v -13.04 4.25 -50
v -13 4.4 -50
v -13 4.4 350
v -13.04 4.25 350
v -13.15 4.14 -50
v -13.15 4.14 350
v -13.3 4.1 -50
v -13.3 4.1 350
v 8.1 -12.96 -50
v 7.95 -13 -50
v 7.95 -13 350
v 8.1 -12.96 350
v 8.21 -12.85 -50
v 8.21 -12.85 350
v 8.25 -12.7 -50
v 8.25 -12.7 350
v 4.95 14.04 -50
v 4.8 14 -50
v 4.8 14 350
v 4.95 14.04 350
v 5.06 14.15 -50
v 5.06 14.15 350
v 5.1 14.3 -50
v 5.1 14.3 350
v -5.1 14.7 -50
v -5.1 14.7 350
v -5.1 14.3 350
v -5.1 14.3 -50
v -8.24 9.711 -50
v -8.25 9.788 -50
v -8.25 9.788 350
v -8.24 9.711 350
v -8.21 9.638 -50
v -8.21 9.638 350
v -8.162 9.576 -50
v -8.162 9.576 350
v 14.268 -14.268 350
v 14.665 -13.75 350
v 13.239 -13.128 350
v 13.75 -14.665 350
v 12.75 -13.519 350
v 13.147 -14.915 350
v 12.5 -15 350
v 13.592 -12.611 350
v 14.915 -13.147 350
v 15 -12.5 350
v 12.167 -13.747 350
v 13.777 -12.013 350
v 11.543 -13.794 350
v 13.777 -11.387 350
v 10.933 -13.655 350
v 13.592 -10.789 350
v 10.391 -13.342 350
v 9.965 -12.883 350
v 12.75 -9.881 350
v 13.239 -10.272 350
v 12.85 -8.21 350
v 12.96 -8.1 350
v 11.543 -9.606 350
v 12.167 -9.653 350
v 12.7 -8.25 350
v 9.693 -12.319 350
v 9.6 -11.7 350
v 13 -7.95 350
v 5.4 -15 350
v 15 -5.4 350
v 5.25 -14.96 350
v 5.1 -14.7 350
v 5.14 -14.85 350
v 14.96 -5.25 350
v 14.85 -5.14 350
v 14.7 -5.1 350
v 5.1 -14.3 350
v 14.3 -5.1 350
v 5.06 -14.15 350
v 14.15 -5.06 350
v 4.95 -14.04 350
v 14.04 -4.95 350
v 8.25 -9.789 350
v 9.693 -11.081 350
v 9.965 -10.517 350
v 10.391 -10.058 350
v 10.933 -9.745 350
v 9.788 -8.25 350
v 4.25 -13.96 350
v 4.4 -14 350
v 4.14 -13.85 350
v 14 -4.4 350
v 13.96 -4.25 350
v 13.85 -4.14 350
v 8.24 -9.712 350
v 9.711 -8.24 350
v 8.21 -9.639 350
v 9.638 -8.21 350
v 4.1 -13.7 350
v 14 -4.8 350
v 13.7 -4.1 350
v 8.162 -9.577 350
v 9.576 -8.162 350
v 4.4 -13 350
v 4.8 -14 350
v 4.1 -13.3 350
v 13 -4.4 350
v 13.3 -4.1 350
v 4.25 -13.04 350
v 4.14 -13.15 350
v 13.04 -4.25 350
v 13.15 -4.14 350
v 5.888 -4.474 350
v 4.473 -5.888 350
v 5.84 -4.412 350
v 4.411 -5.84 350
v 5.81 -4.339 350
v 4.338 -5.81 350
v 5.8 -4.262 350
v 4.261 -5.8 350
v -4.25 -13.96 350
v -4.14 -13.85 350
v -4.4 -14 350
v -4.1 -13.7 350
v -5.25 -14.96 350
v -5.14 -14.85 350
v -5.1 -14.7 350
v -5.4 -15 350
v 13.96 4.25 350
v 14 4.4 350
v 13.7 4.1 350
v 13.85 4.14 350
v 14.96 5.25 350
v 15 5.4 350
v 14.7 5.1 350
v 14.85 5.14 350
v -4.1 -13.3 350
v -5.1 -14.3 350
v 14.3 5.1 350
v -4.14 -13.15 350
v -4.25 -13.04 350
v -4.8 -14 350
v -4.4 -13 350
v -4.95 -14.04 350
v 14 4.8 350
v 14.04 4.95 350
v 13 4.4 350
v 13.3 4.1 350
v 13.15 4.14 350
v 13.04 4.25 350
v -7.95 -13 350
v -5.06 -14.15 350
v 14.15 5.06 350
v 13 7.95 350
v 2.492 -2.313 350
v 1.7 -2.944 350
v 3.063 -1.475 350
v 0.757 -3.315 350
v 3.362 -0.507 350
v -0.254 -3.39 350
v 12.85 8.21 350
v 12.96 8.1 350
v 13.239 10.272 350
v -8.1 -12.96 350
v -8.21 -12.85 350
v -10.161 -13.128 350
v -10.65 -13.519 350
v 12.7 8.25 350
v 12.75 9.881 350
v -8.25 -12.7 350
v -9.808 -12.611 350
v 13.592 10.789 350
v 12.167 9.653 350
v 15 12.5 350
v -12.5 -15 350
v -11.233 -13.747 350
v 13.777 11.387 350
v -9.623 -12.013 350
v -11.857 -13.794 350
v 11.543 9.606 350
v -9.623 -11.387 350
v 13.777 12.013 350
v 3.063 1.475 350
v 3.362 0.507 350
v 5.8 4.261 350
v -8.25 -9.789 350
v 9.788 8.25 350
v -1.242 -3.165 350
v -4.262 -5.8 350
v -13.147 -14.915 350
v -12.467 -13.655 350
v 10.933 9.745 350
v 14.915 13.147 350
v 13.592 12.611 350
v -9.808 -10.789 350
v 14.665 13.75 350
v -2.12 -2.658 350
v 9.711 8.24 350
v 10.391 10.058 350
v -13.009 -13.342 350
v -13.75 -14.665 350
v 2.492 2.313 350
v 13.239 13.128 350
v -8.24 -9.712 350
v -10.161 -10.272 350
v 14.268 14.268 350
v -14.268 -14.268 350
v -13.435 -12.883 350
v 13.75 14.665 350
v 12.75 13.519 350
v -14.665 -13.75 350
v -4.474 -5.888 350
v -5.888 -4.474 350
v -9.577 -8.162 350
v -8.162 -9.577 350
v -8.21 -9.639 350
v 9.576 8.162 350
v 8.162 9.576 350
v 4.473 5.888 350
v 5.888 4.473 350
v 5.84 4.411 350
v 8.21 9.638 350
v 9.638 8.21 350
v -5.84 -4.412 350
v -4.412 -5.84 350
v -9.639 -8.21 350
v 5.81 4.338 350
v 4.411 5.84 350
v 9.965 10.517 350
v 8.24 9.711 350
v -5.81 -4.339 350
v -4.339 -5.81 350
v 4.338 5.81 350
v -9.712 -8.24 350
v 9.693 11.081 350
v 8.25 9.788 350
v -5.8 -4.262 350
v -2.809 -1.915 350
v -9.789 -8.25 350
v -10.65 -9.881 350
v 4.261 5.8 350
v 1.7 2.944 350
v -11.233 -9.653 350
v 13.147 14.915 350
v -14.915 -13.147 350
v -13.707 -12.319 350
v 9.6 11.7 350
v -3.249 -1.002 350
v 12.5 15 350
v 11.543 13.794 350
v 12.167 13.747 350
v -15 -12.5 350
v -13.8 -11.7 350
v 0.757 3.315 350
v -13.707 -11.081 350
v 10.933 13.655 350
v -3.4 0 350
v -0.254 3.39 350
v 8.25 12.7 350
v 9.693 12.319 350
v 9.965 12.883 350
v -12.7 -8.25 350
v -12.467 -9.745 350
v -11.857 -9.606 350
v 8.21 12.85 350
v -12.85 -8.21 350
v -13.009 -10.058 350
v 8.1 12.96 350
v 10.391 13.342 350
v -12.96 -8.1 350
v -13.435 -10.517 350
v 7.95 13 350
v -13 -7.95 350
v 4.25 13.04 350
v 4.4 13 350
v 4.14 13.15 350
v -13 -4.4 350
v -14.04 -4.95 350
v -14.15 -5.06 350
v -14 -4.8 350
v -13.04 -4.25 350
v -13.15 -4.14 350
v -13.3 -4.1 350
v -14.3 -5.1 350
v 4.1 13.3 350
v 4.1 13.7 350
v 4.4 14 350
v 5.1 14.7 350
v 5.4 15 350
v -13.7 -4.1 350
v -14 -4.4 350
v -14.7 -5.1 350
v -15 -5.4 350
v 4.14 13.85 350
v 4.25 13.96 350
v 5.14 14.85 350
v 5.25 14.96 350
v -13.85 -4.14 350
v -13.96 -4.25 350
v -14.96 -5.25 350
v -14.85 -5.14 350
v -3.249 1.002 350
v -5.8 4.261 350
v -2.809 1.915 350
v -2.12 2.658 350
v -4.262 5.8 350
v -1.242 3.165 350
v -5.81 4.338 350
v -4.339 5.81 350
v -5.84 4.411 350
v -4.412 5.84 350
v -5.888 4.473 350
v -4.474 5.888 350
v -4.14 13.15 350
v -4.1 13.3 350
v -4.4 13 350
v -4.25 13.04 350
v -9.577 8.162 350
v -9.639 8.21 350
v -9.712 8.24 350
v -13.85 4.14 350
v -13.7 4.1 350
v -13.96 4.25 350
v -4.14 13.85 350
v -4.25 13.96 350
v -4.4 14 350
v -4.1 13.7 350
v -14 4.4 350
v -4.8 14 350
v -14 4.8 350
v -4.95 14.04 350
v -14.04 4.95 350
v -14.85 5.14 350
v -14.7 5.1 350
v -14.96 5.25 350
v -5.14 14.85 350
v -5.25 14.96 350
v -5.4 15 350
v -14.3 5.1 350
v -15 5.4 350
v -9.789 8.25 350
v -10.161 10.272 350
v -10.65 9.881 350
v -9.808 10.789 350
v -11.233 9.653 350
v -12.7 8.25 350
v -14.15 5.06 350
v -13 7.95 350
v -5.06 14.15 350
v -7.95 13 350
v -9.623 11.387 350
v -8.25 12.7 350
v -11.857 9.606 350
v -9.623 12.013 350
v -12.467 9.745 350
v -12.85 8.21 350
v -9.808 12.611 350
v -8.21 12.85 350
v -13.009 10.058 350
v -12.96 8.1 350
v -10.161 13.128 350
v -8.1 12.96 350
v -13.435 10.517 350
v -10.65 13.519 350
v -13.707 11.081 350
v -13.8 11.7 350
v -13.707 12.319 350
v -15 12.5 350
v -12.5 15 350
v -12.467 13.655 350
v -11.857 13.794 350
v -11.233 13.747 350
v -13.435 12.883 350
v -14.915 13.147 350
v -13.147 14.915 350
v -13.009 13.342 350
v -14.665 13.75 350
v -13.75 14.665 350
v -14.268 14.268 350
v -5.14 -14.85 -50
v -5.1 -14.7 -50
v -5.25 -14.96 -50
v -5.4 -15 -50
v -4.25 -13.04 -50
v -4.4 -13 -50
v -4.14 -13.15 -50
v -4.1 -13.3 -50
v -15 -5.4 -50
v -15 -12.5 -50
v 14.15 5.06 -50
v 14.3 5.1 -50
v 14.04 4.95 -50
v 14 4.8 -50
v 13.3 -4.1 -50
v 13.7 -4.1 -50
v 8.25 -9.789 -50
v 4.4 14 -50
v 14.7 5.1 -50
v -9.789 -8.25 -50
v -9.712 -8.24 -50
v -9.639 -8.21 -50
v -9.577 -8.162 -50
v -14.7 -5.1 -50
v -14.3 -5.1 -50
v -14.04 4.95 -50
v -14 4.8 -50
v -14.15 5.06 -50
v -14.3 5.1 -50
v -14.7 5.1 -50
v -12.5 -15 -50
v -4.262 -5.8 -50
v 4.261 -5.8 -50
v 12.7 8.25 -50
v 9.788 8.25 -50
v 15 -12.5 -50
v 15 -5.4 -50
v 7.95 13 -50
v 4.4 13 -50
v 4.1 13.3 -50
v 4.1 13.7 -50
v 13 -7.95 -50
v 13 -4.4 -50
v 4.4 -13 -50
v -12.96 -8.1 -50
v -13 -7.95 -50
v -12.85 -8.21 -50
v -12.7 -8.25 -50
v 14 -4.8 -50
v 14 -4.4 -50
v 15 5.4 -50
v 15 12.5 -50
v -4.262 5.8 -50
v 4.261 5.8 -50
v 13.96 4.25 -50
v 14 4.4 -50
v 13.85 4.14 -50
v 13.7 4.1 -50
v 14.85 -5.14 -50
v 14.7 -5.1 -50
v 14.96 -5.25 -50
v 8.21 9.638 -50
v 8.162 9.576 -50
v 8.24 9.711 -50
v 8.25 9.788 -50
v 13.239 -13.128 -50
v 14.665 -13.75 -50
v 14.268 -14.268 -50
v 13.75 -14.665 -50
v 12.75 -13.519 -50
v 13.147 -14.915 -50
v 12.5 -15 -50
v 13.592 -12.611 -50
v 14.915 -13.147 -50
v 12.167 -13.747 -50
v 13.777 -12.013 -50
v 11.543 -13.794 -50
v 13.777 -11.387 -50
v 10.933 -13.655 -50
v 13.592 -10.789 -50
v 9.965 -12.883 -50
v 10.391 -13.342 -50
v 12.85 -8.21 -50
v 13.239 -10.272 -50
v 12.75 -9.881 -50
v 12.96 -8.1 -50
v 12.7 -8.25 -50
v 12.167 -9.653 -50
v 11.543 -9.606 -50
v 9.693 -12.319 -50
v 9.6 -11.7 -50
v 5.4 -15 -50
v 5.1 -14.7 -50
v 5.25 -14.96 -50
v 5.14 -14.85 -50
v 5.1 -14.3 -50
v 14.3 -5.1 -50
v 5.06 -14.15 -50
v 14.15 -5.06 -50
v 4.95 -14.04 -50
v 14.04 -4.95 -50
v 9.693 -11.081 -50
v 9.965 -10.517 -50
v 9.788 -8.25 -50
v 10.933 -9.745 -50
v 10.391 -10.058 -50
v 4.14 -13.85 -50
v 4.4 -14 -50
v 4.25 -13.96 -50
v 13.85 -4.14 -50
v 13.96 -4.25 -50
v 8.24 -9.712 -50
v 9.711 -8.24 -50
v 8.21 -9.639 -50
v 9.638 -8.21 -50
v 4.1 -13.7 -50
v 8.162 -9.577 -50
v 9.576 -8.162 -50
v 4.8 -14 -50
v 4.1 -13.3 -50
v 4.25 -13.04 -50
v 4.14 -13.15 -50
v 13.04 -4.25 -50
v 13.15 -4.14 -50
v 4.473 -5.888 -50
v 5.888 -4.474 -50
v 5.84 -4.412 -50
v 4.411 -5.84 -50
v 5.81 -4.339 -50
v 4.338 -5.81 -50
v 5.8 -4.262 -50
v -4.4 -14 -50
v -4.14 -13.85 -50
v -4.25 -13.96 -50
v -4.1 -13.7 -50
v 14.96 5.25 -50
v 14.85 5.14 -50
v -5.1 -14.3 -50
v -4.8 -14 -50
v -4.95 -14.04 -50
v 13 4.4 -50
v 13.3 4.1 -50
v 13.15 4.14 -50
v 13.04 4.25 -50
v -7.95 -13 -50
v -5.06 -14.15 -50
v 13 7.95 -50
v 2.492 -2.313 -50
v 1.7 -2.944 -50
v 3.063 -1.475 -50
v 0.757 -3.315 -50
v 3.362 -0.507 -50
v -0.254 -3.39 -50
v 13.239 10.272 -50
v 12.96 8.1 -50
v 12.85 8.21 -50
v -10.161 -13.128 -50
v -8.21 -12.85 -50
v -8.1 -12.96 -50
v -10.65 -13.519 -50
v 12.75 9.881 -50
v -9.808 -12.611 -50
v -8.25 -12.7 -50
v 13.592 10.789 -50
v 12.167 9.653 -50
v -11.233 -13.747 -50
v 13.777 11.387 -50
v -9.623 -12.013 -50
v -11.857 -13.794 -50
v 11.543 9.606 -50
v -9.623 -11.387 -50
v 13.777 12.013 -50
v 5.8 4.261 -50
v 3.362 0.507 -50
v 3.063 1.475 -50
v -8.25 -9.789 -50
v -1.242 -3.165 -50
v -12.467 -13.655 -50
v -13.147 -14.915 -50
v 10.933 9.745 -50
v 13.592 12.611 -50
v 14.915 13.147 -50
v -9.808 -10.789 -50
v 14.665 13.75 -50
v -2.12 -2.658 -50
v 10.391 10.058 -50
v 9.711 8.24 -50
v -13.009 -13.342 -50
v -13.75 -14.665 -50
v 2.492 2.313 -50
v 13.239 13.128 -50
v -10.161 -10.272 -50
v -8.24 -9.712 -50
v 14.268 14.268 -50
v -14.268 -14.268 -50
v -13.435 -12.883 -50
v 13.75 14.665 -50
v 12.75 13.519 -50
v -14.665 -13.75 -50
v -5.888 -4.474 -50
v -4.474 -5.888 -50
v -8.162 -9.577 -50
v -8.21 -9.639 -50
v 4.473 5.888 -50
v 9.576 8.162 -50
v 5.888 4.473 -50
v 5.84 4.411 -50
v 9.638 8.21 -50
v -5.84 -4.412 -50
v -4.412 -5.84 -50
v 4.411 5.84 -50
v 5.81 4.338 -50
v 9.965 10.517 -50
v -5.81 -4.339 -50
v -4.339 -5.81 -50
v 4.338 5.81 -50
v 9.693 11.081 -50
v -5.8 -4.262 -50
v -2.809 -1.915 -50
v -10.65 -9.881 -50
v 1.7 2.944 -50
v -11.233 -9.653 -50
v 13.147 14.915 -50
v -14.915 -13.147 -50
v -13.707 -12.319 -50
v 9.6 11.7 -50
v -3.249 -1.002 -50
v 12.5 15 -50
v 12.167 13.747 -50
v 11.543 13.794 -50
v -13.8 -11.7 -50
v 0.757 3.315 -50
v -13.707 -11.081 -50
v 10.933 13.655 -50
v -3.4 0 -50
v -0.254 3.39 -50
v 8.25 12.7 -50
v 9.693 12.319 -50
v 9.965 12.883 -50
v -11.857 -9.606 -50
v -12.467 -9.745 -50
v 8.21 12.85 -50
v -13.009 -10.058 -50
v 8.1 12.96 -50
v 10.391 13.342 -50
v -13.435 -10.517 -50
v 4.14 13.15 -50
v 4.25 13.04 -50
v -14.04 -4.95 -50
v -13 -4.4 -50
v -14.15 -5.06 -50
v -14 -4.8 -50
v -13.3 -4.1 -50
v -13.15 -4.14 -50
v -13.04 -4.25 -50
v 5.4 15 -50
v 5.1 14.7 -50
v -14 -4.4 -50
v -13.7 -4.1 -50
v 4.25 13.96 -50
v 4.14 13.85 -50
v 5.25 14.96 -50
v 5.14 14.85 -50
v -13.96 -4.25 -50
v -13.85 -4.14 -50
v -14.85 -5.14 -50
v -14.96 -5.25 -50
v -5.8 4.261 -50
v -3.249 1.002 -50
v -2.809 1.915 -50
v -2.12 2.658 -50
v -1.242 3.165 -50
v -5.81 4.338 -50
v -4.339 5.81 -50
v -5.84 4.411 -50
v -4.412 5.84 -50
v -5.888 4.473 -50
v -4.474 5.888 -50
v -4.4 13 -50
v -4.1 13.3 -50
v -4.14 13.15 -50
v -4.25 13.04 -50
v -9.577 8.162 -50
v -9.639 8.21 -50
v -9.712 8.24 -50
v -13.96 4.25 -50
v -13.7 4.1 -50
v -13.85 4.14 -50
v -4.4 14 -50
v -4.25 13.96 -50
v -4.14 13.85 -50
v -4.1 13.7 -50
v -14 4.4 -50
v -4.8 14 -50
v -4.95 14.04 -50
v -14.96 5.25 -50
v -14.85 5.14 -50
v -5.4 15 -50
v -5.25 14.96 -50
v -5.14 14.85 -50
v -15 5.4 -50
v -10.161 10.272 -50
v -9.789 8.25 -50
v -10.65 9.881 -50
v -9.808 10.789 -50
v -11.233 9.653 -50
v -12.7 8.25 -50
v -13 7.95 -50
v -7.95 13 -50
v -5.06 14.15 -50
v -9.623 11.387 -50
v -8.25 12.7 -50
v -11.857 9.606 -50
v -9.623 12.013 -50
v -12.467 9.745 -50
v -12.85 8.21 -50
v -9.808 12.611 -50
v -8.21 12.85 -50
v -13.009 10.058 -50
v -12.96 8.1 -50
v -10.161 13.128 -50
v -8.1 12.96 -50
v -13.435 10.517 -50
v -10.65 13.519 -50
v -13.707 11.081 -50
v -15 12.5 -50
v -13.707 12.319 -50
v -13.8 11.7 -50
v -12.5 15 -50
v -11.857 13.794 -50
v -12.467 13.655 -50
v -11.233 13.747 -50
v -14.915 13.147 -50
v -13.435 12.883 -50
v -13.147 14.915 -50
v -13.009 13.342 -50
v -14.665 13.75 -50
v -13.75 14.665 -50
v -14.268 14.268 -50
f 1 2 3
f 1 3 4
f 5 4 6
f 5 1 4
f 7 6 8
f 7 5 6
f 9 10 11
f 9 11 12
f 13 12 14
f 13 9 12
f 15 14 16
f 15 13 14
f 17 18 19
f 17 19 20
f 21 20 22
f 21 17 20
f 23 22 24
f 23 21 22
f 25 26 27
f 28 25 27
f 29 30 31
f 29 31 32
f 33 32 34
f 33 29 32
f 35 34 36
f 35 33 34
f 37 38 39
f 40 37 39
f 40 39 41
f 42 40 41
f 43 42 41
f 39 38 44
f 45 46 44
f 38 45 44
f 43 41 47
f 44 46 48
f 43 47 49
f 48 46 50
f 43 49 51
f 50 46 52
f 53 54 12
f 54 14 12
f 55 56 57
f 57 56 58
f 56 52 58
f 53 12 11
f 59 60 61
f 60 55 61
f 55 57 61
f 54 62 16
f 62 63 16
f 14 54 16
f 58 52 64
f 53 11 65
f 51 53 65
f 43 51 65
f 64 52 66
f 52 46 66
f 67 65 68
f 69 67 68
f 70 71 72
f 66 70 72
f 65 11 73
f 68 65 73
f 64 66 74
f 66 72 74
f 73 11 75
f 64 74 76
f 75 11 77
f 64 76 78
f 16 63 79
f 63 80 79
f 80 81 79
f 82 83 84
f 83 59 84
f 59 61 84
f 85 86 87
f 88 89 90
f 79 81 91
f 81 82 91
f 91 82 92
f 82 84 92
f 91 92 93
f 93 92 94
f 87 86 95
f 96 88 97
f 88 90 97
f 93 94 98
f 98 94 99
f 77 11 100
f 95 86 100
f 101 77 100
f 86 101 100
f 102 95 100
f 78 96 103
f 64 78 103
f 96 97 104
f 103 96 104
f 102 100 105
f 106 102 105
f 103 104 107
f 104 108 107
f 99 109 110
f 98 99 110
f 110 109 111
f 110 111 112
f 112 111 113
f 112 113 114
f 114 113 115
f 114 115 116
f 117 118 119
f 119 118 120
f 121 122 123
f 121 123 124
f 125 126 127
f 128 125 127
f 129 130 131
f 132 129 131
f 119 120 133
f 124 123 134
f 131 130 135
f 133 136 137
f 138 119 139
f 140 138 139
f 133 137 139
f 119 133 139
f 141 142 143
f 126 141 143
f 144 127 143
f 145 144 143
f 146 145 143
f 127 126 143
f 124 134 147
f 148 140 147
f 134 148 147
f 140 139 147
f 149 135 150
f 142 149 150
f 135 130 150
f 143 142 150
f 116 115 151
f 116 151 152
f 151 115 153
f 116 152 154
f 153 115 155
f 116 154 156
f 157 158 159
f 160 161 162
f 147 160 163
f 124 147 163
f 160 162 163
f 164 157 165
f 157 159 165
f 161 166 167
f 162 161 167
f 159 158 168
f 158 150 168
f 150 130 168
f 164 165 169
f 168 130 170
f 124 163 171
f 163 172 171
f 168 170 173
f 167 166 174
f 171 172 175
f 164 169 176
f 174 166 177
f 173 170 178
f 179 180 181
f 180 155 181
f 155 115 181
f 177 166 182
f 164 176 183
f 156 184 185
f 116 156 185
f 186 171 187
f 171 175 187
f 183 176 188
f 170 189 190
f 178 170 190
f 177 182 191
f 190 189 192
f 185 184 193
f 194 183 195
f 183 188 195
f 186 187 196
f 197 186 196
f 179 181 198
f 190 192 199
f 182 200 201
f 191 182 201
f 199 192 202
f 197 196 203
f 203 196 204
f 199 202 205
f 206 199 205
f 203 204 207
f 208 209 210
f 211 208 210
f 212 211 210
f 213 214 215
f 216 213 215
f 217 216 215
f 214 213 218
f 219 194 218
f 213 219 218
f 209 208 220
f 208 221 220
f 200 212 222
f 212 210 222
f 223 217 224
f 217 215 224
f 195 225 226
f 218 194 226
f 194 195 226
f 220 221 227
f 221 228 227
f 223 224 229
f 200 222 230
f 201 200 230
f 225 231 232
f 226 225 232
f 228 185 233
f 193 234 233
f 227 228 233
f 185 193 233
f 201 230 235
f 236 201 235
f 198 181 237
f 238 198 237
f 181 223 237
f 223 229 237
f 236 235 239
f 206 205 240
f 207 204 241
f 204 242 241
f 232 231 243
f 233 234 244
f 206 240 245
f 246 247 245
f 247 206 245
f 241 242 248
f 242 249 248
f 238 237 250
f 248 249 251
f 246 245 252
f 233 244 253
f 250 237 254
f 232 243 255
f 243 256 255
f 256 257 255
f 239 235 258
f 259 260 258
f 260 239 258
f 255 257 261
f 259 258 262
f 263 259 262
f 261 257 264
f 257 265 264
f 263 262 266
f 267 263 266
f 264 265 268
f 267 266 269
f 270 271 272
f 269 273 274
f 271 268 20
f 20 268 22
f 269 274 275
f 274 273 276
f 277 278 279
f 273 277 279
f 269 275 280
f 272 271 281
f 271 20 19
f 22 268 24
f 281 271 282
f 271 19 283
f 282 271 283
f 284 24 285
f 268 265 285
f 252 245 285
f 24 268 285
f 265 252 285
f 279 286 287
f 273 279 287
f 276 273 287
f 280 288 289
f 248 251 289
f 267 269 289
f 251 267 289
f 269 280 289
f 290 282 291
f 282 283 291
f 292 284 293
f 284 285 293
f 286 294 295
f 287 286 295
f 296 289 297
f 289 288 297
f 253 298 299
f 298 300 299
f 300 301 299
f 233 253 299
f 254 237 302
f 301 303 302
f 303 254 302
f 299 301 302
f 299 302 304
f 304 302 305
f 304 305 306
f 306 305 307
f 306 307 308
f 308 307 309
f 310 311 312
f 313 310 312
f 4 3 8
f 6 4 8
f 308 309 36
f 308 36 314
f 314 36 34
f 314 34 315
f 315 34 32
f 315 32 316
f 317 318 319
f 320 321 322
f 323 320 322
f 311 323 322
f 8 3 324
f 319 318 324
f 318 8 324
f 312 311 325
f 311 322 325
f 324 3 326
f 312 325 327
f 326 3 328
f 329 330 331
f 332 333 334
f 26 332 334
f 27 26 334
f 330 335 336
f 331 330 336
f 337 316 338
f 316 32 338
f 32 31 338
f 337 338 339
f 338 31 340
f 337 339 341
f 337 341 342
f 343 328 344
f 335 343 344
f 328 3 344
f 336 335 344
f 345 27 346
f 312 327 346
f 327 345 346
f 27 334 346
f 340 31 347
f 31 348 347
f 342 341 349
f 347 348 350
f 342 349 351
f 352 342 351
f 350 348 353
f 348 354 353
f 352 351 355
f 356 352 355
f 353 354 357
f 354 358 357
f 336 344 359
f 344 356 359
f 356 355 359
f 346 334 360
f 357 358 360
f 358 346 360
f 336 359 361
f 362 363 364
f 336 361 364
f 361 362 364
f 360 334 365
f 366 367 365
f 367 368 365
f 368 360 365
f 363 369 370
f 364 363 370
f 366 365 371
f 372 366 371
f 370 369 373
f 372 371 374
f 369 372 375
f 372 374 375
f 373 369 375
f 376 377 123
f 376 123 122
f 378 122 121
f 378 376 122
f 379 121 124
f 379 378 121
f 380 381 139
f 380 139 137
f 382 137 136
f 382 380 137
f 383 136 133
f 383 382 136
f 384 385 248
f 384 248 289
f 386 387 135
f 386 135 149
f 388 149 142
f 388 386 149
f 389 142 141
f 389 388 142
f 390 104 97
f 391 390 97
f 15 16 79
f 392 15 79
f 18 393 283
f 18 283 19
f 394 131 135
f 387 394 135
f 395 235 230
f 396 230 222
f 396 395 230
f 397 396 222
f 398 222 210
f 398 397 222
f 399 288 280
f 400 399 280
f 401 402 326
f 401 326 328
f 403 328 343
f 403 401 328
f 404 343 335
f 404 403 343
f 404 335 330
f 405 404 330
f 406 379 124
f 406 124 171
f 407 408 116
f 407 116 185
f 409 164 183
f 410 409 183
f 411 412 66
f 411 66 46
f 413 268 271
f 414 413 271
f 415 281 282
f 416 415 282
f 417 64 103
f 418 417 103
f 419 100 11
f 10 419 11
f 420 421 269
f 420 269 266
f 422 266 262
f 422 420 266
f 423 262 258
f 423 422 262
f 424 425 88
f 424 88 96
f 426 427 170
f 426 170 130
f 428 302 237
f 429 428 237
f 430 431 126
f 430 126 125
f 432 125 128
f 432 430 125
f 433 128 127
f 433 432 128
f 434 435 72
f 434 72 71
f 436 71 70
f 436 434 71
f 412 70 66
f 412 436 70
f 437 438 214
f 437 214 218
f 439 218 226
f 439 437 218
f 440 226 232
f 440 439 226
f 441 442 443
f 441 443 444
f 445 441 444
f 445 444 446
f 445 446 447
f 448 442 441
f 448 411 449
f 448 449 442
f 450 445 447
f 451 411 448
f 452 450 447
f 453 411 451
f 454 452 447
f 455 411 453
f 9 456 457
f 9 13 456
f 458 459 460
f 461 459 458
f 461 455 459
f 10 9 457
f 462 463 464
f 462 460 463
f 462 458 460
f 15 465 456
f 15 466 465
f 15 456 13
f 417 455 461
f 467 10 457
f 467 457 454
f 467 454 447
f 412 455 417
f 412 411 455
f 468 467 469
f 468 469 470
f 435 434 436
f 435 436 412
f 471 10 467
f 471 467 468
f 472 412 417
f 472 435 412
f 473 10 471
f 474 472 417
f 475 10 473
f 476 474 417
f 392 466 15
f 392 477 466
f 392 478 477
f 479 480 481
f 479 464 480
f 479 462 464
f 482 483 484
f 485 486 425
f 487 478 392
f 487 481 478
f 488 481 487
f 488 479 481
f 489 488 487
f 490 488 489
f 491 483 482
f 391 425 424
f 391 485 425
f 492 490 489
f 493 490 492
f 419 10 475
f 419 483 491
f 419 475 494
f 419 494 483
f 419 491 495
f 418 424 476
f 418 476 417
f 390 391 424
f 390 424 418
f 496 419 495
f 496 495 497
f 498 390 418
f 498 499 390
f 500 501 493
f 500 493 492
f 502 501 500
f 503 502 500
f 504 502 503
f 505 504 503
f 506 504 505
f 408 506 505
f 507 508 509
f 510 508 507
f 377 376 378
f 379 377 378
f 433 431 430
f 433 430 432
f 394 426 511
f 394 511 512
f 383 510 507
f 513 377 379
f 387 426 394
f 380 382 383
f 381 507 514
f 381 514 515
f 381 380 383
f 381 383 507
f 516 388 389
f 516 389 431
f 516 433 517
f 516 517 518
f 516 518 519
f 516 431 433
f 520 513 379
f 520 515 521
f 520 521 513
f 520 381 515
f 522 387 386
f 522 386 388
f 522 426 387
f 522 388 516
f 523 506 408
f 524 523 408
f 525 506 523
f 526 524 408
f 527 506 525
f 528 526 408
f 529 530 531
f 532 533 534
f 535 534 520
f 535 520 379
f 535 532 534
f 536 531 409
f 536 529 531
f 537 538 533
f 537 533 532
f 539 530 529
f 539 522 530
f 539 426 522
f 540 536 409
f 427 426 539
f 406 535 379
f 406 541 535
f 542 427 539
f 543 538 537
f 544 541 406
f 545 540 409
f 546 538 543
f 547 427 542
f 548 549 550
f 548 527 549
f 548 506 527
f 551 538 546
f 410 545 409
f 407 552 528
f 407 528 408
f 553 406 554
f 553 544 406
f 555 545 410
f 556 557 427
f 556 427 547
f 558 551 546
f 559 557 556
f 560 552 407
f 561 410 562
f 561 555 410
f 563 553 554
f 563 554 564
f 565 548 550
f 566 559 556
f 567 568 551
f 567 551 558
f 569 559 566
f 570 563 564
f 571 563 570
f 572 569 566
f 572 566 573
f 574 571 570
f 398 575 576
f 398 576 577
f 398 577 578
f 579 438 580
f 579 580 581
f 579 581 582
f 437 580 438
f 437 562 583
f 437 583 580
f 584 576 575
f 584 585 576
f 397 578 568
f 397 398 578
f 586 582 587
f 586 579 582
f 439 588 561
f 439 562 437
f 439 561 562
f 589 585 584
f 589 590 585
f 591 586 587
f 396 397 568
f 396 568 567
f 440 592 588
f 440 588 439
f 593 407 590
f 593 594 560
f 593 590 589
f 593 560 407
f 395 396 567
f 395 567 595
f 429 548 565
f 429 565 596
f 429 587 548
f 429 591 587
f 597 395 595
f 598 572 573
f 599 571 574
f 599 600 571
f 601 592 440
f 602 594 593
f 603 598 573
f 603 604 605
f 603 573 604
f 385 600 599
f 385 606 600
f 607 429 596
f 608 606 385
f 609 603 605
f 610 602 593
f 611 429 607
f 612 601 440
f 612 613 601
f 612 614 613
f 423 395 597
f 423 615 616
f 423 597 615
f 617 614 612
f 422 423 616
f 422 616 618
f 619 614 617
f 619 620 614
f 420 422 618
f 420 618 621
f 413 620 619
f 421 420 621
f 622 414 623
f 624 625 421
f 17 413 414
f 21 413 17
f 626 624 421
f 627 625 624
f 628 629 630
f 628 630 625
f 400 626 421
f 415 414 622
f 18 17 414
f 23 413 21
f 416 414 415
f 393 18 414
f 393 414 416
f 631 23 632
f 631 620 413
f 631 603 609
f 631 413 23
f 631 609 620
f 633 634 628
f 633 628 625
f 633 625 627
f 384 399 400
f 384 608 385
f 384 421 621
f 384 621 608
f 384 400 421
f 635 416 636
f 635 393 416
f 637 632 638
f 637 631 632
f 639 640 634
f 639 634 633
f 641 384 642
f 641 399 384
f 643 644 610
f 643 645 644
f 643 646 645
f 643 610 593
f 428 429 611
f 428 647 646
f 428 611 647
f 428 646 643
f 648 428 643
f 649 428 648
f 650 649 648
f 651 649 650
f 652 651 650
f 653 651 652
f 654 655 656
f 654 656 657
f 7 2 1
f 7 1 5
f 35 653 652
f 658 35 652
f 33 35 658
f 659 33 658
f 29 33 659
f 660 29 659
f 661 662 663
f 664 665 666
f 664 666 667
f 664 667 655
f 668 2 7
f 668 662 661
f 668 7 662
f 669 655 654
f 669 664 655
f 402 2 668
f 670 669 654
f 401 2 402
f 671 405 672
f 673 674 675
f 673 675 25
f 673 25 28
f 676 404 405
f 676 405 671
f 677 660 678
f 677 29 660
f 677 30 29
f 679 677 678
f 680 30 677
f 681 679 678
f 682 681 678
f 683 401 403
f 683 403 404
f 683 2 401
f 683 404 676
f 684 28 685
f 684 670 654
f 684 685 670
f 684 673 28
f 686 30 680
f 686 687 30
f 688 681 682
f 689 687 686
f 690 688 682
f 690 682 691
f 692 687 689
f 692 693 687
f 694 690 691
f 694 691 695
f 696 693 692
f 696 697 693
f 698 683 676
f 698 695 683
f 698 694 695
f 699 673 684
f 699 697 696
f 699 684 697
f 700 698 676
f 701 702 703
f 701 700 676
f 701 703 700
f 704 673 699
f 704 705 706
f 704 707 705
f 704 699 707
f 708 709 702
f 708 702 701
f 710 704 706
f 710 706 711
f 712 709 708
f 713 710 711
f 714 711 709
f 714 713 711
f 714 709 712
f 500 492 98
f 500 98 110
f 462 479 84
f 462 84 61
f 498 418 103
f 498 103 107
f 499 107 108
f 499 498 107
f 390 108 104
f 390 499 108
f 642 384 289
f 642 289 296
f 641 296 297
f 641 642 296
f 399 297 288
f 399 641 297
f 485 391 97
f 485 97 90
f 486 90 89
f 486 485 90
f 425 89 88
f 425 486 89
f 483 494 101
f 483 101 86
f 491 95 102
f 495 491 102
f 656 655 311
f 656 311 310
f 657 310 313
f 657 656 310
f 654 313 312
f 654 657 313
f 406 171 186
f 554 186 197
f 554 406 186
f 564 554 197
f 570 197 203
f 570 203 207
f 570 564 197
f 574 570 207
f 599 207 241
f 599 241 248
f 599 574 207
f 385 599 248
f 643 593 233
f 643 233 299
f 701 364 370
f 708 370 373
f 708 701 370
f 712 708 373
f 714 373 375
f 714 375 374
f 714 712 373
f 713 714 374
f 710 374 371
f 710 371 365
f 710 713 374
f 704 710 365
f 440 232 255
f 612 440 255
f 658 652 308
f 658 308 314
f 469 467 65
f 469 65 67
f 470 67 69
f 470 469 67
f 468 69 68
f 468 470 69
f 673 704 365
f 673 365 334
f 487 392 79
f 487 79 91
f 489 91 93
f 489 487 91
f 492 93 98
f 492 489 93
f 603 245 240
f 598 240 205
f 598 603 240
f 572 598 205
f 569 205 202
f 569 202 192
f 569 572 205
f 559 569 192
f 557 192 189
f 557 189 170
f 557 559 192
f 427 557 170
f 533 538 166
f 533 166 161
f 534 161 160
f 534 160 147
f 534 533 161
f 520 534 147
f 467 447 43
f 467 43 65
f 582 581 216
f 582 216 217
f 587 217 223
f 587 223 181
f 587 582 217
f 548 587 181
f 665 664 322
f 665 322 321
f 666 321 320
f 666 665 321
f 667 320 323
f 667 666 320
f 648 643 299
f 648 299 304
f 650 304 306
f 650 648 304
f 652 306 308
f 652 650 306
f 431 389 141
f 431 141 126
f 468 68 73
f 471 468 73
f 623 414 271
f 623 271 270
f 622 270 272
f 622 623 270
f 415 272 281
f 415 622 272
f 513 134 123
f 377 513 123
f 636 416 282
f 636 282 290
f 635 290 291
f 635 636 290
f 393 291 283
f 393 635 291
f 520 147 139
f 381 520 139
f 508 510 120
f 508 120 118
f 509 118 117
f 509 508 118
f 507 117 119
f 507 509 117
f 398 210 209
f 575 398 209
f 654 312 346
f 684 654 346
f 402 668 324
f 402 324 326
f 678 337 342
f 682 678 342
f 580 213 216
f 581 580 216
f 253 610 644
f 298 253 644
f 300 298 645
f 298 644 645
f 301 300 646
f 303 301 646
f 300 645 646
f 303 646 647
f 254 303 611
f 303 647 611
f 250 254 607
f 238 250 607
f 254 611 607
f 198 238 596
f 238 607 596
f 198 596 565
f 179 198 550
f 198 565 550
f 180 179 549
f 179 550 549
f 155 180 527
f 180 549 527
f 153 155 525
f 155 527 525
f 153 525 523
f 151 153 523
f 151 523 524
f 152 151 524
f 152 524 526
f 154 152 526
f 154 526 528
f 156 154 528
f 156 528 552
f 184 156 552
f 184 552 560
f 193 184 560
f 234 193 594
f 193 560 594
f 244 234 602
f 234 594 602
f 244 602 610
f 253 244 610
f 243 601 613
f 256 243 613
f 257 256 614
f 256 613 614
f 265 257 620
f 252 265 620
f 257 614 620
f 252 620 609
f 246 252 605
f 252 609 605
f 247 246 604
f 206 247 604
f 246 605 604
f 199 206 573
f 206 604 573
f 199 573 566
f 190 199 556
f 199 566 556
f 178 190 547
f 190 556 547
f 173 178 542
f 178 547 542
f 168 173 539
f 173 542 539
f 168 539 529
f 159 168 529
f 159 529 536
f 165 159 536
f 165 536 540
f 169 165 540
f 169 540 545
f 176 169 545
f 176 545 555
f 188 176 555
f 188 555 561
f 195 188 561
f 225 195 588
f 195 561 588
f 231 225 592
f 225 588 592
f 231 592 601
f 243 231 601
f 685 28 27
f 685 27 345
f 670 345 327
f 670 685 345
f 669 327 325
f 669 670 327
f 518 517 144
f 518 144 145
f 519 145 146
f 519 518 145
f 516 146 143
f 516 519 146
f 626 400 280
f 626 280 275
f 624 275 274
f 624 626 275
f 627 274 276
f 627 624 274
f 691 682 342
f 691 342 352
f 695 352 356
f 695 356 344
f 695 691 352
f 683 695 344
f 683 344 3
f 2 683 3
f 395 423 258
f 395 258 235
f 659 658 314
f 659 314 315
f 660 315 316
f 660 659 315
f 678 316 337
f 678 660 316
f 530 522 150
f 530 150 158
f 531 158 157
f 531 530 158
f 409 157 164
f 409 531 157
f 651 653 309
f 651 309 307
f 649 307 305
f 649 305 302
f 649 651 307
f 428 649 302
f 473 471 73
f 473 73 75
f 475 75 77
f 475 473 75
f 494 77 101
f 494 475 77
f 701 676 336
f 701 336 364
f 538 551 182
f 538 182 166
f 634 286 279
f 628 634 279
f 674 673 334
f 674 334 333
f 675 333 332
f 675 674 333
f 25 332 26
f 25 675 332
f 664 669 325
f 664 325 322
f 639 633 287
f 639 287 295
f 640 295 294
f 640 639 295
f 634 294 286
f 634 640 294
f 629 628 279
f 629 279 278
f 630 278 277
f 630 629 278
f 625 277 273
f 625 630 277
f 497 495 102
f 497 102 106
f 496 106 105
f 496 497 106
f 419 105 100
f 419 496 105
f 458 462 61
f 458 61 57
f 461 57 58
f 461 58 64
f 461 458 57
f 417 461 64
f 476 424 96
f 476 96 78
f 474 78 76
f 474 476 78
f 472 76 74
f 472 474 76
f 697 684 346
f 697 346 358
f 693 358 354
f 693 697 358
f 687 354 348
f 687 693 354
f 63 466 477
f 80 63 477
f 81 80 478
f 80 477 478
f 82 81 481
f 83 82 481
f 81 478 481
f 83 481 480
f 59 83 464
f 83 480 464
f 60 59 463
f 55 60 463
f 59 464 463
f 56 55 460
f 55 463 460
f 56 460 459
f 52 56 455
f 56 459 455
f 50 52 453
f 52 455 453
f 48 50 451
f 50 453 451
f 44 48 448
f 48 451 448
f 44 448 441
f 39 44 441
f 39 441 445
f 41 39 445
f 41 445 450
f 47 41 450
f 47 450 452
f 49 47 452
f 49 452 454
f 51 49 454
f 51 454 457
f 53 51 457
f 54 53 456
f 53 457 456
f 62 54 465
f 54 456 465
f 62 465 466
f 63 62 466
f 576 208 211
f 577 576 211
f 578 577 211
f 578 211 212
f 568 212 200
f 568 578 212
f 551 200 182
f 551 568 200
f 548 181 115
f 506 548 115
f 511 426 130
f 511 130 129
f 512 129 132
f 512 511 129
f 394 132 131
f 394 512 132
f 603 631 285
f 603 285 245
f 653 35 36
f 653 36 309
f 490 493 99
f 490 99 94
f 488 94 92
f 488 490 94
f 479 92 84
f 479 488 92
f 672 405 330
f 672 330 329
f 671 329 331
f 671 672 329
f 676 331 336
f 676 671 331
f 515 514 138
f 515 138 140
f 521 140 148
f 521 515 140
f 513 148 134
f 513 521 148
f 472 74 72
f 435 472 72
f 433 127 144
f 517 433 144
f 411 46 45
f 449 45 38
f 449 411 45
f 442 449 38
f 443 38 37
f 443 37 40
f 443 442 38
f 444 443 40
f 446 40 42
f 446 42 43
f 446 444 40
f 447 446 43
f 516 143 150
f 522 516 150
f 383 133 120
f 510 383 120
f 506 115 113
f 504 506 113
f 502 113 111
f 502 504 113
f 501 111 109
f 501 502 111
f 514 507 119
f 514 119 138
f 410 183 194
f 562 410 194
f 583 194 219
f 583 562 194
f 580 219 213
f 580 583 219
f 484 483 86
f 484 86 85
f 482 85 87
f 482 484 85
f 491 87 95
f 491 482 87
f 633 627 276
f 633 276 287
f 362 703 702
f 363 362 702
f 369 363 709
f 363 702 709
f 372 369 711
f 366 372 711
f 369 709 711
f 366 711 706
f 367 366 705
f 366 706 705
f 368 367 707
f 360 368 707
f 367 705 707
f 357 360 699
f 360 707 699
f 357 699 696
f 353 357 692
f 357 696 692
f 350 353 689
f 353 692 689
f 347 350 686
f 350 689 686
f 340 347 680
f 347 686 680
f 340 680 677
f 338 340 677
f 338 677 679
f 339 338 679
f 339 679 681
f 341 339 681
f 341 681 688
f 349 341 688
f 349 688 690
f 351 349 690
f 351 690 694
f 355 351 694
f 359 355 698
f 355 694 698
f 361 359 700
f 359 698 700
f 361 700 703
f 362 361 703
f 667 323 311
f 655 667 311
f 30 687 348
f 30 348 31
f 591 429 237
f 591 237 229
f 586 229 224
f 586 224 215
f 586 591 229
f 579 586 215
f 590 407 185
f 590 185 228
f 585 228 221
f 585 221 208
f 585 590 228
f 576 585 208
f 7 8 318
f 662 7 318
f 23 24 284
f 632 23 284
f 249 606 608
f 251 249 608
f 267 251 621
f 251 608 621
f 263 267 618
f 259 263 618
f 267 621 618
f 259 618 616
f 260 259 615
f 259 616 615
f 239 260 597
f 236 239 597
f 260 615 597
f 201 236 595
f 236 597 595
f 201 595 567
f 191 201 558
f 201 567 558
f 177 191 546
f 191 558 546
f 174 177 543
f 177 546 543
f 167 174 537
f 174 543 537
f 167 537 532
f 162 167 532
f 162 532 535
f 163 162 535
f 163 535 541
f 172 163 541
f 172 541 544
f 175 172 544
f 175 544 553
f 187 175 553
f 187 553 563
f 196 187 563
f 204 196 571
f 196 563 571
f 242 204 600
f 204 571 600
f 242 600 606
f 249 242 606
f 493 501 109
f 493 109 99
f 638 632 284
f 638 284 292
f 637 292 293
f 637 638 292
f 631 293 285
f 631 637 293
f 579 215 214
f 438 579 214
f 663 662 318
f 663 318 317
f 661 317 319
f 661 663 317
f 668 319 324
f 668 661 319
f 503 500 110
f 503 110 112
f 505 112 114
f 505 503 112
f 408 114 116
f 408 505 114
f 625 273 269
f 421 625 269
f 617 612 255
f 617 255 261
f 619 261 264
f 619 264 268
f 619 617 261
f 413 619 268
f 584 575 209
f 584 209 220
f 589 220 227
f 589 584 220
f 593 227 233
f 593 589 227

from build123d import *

# Parameters (mm, degrees)
CROQUIS1_R              = 2.1
CROQUIS1_R_2            = 3.4
SALIENTE_EXTRUIR1_DEPTH = 400


with BuildPart() as part:
    # Croquis1 → Saliente-Extruir1 (new body)
    with BuildSketch(Plane(origin=(0, 0, -50), x_dir=(-1, 0, 0), z_dir=(0, 0, -1))):
        with BuildLine():
            Line((14.7, -5.1), (14.3, -5.1))
            ThreePointArc((14.3, -5.1), (14.087867966, -5.012132034), (14, -4.8))
            Line((14, -4.8), (14, -4.4))
            ThreePointArc((14, -4.4), (13.912132034, -4.187867966), (13.7, -4.1))
            Line((13.7, -4.1), (13.3, -4.1))
            ThreePointArc((13.3, -4.1), (13.087867966, -4.187867966), (13, -4.4))
            Line((13, -4.4), (13, -7.95))
            ThreePointArc((13, -7.95), (12.912132034, -8.162132034), (12.7, -8.25))
            Line((12.7, -8.25), (9.789264108, -8.25))
            ThreePointArc((9.789264108, -8.25), (9.674477865, -8.22717164), (9.577160832, -8.162160788))
            Line((9.577160832, -8.162160788), (5.887896723, -4.473896751))
            ThreePointArc((5.887896723, -4.473896751), (5.822843922, -4.376559778), (5.8, -4.261735963))
            Line((5.8, -4.261735963), (5.8, 4.260735931))
            ThreePointArc((5.8, 4.260735931), (5.82283614, 4.375540961), (5.887867966, 4.472867966))
            Line((5.887867966, 4.472867966), (9.577132034, 8.162132034))
            ThreePointArc((9.577132034, 8.162132034), (9.674459039, 8.22716386), (9.789264069, 8.25))
            Line((9.789264069, 8.25), (12.7, 8.25))
            ThreePointArc((12.7, 8.25), (12.912132034, 8.162132034), (13, 7.95))
            Line((13, 7.95), (13, 4.4))
            ThreePointArc((13, 4.4), (13.087867966, 4.187867966), (13.3, 4.1))
            Line((13.3, 4.1), (13.7, 4.1))
            ThreePointArc((13.7, 4.1), (13.912132034, 4.187867966), (14, 4.4))
            Line((14, 4.4), (14, 4.8))
            ThreePointArc((14, 4.8), (14.087867966, 5.012132034), (14.3, 5.1))
            Line((14.3, 5.1), (14.7, 5.1))
            ThreePointArc((14.7, 5.1), (14.912132034, 5.187867966), (15, 5.4))
            Line((15, 5.4), (15, 12.5))
            ThreePointArc((15, 12.5), (14.267766953, 14.267766953), (12.5, 15))
            Line((12.5, 15), (5.4, 15))
            ThreePointArc((5.4, 15), (5.187867966, 14.912132034), (5.1, 14.7))
            Line((5.1, 14.7), (5.1, 14.3))
            ThreePointArc((5.1, 14.3), (5.012132034, 14.087867966), (4.8, 14))
            Line((4.8, 14), (4.4, 14))
            ThreePointArc((4.4, 14), (4.187867966, 13.912132034), (4.1, 13.7))
            Line((4.1, 13.7), (4.1, 13.3))
            ThreePointArc((4.1, 13.3), (4.187867966, 13.087867966), (4.4, 13))
            Line((4.4, 13), (7.95, 13))
            ThreePointArc((7.95, 13), (8.162132034, 12.912132034), (8.25, 12.7))
            Line((8.25, 12.7), (8.25, 9.788264069))
            ThreePointArc((8.25, 9.788264069), (8.22716386, 9.673459039), (8.162132034, 9.576132034))
            Line((8.162132034, 9.576132034), (4.473867966, 5.887867966))
            ThreePointArc((4.473867966, 5.887867966), (4.376540961, 5.82283614), (4.261735931, 5.8))
            Line((4.261735931, 5.8), (-4.260735892, 5.8))
            ThreePointArc((-4.260735892, 5.8), (-4.375522135, 5.82282836), (-4.472839168, 5.887839212))
            Line((-4.472839168, 5.887839212), (-8.162103277, 9.576103249))
            ThreePointArc((-8.162103277, 9.576103249), (-8.227156078, 9.673440222), (-8.25, 9.788264037))
            Line((-8.25, 9.788264037), (-8.25, 12.7))
            ThreePointArc((-8.25, 12.7), (-8.162132034, 12.912132034), (-7.95, 13))
            Line((-7.95, 13), (-4.4, 13))
            ThreePointArc((-4.4, 13), (-4.187867966, 13.087867966), (-4.1, 13.3))
            Line((-4.1, 13.3), (-4.1, 13.7))
            ThreePointArc((-4.1, 13.7), (-4.187867966, 13.912132034), (-4.4, 14))
            Line((-4.4, 14), (-4.8, 14))
            ThreePointArc((-4.8, 14), (-5.012132034, 14.087867966), (-5.1, 14.3))
            Line((-5.1, 14.3), (-5.1, 14.7))
            ThreePointArc((-5.1, 14.7), (-5.187867966, 14.912132034), (-5.4, 15))
            Line((-5.4, 15), (-12.5, 15))
            ThreePointArc((-12.5, 15), (-14.267766953, 14.267766953), (-15, 12.5))
            Line((-15, 12.5), (-15, 5.4))
            ThreePointArc((-15, 5.4), (-14.912132034, 5.187867966), (-14.7, 5.1))
            Line((-14.7, 5.1), (-14.3, 5.1))
            ThreePointArc((-14.3, 5.1), (-14.087867966, 5.012132034), (-14, 4.8))
            Line((-14, 4.8), (-14, 4.4))
            ThreePointArc((-14, 4.4), (-13.912132034, 4.187867966), (-13.7, 4.1))
            Line((-13.7, 4.1), (-13.3, 4.1))
            ThreePointArc((-13.3, 4.1), (-13.087867966, 4.187867966), (-13, 4.4))
            Line((-13, 4.4), (-13, 7.95))
            ThreePointArc((-13, 7.95), (-12.912132034, 8.162132034), (-12.7, 8.25))
            Line((-12.7, 8.25), (-9.788264037, 8.25))
            ThreePointArc((-9.788264037, 8.25), (-9.673440222, 8.227156078), (-9.576103249, 8.162103277))
            Line((-9.576103249, 8.162103277), (-5.887839212, 4.472839168))
            ThreePointArc((-5.887839212, 4.472839168), (-5.82282836, 4.375522135), (-5.8, 4.260735892))
            Line((-5.8, 4.260735892), (-5.8, -4.261735931))
            ThreePointArc((-5.8, -4.261735931), (-5.82283614, -4.376540961), (-5.887867966, -4.473867966))
            Line((-5.887867966, -4.473867966), (-9.576132034, -8.162132034))
            ThreePointArc((-9.576132034, -8.162132034), (-9.673459039, -8.22716386), (-9.788264069, -8.25))
            Line((-9.788264069, -8.25), (-12.7, -8.25))
            ThreePointArc((-12.7, -8.25), (-12.912132034, -8.162132034), (-13, -7.95))
            Line((-13, -7.95), (-13, -4.4))
            ThreePointArc((-13, -4.4), (-13.087867966, -4.187867966), (-13.3, -4.1))
            Line((-13.3, -4.1), (-13.7, -4.1))
            ThreePointArc((-13.7, -4.1), (-13.912132034, -4.187867966), (-14, -4.4))
            Line((-14, -4.4), (-14, -4.8))
            ThreePointArc((-14, -4.8), (-14.087867966, -5.012132034), (-14.3, -5.1))
            Line((-14.3, -5.1), (-14.7, -5.1))
            ThreePointArc((-14.7, -5.1), (-14.912132034, -5.187867966), (-15, -5.4))
            Line((-15, -5.4), (-15, -12.5))
            ThreePointArc((-15, -12.5), (-14.267766953, -14.267766953), (-12.5, -15))
            Line((-12.5, -15), (-5.4, -15))
            ThreePointArc((-5.4, -15), (-5.187867966, -14.912132034), (-5.1, -14.7))
            Line((-5.1, -14.7), (-5.1, -14.3))
            ThreePointArc((-5.1, -14.3), (-5.012132034, -14.087867966), (-4.8, -14))
            Line((-4.8, -14), (-4.4, -14))
            ThreePointArc((-4.4, -14), (-4.187867966, -13.912132034), (-4.1, -13.7))
            Line((-4.1, -13.7), (-4.1, -13.3))
            ThreePointArc((-4.1, -13.3), (-4.187867966, -13.087867966), (-4.4, -13))
            Line((-4.4, -13), (-7.95, -13))
            ThreePointArc((-7.95, -13), (-8.162132034, -12.912132034), (-8.25, -12.7))
            Line((-8.25, -12.7), (-8.25, -9.789264069))
            ThreePointArc((-8.25, -9.789264069), (-8.22716386, -9.674459039), (-8.162132034, -9.577132034))
            Line((-8.162132034, -9.577132034), (-4.472867966, -5.887867966))
            ThreePointArc((-4.472867966, -5.887867966), (-4.375540961, -5.82283614), (-4.260735931, -5.8))
            Line((-4.260735931, -5.8), (4.261735963, -5.8))
            ThreePointArc((4.261735963, -5.8), (4.376559778, -5.822843922), (4.473896751, -5.887896723))
            Line((4.473896751, -5.887896723), (8.162160788, -9.577160832))
            ThreePointArc((8.162160788, -9.577160832), (8.22717164, -9.674477865), (8.25, -9.789264108))
            Line((8.25, -9.789264108), (8.25, -12.7))
            ThreePointArc((8.25, -12.7), (8.162132034, -12.912132034), (7.95, -13))
            Line((7.95, -13), (4.4, -13))
            ThreePointArc((4.4, -13), (4.187867966, -13.087867966), (4.1, -13.3))
            Line((4.1, -13.3), (4.1, -13.7))
            ThreePointArc((4.1, -13.7), (4.187867966, -13.912132034), (4.4, -14))
            Line((4.4, -14), (4.8, -14))
            ThreePointArc((4.8, -14), (5.012132034, -14.087867966), (5.1, -14.3))
            Line((5.1, -14.3), (5.1, -14.7))
            ThreePointArc((5.1, -14.7), (5.187867966, -14.912132034), (5.4, -15))
            Line((5.4, -15), (12.5, -15))
            ThreePointArc((12.5, -15), (14.267766953, -14.267766953), (15, -12.5))
            Line((15, -12.5), (15, -5.4))
            ThreePointArc((15, -5.4), (14.912132034, -5.187867966), (14.7, -5.1))
        make_face()
        with Locations((-11.7, 11.7)):
            Circle(CROQUIS1_R, mode=Mode.SUBTRACT)
        with Locations((-11.7, -11.7)):
            Circle(CROQUIS1_R, mode=Mode.SUBTRACT)
        Circle(CROQUIS1_R_2, mode=Mode.SUBTRACT)
        with Locations((11.7, 11.7)):
            Circle(CROQUIS1_R, mode=Mode.SUBTRACT)
        with Locations((11.7, -11.7)):
            Circle(CROQUIS1_R, mode=Mode.SUBTRACT)
    extrude(amount=-SALIENTE_EXTRUIR1_DEPTH)


solid = part.part
